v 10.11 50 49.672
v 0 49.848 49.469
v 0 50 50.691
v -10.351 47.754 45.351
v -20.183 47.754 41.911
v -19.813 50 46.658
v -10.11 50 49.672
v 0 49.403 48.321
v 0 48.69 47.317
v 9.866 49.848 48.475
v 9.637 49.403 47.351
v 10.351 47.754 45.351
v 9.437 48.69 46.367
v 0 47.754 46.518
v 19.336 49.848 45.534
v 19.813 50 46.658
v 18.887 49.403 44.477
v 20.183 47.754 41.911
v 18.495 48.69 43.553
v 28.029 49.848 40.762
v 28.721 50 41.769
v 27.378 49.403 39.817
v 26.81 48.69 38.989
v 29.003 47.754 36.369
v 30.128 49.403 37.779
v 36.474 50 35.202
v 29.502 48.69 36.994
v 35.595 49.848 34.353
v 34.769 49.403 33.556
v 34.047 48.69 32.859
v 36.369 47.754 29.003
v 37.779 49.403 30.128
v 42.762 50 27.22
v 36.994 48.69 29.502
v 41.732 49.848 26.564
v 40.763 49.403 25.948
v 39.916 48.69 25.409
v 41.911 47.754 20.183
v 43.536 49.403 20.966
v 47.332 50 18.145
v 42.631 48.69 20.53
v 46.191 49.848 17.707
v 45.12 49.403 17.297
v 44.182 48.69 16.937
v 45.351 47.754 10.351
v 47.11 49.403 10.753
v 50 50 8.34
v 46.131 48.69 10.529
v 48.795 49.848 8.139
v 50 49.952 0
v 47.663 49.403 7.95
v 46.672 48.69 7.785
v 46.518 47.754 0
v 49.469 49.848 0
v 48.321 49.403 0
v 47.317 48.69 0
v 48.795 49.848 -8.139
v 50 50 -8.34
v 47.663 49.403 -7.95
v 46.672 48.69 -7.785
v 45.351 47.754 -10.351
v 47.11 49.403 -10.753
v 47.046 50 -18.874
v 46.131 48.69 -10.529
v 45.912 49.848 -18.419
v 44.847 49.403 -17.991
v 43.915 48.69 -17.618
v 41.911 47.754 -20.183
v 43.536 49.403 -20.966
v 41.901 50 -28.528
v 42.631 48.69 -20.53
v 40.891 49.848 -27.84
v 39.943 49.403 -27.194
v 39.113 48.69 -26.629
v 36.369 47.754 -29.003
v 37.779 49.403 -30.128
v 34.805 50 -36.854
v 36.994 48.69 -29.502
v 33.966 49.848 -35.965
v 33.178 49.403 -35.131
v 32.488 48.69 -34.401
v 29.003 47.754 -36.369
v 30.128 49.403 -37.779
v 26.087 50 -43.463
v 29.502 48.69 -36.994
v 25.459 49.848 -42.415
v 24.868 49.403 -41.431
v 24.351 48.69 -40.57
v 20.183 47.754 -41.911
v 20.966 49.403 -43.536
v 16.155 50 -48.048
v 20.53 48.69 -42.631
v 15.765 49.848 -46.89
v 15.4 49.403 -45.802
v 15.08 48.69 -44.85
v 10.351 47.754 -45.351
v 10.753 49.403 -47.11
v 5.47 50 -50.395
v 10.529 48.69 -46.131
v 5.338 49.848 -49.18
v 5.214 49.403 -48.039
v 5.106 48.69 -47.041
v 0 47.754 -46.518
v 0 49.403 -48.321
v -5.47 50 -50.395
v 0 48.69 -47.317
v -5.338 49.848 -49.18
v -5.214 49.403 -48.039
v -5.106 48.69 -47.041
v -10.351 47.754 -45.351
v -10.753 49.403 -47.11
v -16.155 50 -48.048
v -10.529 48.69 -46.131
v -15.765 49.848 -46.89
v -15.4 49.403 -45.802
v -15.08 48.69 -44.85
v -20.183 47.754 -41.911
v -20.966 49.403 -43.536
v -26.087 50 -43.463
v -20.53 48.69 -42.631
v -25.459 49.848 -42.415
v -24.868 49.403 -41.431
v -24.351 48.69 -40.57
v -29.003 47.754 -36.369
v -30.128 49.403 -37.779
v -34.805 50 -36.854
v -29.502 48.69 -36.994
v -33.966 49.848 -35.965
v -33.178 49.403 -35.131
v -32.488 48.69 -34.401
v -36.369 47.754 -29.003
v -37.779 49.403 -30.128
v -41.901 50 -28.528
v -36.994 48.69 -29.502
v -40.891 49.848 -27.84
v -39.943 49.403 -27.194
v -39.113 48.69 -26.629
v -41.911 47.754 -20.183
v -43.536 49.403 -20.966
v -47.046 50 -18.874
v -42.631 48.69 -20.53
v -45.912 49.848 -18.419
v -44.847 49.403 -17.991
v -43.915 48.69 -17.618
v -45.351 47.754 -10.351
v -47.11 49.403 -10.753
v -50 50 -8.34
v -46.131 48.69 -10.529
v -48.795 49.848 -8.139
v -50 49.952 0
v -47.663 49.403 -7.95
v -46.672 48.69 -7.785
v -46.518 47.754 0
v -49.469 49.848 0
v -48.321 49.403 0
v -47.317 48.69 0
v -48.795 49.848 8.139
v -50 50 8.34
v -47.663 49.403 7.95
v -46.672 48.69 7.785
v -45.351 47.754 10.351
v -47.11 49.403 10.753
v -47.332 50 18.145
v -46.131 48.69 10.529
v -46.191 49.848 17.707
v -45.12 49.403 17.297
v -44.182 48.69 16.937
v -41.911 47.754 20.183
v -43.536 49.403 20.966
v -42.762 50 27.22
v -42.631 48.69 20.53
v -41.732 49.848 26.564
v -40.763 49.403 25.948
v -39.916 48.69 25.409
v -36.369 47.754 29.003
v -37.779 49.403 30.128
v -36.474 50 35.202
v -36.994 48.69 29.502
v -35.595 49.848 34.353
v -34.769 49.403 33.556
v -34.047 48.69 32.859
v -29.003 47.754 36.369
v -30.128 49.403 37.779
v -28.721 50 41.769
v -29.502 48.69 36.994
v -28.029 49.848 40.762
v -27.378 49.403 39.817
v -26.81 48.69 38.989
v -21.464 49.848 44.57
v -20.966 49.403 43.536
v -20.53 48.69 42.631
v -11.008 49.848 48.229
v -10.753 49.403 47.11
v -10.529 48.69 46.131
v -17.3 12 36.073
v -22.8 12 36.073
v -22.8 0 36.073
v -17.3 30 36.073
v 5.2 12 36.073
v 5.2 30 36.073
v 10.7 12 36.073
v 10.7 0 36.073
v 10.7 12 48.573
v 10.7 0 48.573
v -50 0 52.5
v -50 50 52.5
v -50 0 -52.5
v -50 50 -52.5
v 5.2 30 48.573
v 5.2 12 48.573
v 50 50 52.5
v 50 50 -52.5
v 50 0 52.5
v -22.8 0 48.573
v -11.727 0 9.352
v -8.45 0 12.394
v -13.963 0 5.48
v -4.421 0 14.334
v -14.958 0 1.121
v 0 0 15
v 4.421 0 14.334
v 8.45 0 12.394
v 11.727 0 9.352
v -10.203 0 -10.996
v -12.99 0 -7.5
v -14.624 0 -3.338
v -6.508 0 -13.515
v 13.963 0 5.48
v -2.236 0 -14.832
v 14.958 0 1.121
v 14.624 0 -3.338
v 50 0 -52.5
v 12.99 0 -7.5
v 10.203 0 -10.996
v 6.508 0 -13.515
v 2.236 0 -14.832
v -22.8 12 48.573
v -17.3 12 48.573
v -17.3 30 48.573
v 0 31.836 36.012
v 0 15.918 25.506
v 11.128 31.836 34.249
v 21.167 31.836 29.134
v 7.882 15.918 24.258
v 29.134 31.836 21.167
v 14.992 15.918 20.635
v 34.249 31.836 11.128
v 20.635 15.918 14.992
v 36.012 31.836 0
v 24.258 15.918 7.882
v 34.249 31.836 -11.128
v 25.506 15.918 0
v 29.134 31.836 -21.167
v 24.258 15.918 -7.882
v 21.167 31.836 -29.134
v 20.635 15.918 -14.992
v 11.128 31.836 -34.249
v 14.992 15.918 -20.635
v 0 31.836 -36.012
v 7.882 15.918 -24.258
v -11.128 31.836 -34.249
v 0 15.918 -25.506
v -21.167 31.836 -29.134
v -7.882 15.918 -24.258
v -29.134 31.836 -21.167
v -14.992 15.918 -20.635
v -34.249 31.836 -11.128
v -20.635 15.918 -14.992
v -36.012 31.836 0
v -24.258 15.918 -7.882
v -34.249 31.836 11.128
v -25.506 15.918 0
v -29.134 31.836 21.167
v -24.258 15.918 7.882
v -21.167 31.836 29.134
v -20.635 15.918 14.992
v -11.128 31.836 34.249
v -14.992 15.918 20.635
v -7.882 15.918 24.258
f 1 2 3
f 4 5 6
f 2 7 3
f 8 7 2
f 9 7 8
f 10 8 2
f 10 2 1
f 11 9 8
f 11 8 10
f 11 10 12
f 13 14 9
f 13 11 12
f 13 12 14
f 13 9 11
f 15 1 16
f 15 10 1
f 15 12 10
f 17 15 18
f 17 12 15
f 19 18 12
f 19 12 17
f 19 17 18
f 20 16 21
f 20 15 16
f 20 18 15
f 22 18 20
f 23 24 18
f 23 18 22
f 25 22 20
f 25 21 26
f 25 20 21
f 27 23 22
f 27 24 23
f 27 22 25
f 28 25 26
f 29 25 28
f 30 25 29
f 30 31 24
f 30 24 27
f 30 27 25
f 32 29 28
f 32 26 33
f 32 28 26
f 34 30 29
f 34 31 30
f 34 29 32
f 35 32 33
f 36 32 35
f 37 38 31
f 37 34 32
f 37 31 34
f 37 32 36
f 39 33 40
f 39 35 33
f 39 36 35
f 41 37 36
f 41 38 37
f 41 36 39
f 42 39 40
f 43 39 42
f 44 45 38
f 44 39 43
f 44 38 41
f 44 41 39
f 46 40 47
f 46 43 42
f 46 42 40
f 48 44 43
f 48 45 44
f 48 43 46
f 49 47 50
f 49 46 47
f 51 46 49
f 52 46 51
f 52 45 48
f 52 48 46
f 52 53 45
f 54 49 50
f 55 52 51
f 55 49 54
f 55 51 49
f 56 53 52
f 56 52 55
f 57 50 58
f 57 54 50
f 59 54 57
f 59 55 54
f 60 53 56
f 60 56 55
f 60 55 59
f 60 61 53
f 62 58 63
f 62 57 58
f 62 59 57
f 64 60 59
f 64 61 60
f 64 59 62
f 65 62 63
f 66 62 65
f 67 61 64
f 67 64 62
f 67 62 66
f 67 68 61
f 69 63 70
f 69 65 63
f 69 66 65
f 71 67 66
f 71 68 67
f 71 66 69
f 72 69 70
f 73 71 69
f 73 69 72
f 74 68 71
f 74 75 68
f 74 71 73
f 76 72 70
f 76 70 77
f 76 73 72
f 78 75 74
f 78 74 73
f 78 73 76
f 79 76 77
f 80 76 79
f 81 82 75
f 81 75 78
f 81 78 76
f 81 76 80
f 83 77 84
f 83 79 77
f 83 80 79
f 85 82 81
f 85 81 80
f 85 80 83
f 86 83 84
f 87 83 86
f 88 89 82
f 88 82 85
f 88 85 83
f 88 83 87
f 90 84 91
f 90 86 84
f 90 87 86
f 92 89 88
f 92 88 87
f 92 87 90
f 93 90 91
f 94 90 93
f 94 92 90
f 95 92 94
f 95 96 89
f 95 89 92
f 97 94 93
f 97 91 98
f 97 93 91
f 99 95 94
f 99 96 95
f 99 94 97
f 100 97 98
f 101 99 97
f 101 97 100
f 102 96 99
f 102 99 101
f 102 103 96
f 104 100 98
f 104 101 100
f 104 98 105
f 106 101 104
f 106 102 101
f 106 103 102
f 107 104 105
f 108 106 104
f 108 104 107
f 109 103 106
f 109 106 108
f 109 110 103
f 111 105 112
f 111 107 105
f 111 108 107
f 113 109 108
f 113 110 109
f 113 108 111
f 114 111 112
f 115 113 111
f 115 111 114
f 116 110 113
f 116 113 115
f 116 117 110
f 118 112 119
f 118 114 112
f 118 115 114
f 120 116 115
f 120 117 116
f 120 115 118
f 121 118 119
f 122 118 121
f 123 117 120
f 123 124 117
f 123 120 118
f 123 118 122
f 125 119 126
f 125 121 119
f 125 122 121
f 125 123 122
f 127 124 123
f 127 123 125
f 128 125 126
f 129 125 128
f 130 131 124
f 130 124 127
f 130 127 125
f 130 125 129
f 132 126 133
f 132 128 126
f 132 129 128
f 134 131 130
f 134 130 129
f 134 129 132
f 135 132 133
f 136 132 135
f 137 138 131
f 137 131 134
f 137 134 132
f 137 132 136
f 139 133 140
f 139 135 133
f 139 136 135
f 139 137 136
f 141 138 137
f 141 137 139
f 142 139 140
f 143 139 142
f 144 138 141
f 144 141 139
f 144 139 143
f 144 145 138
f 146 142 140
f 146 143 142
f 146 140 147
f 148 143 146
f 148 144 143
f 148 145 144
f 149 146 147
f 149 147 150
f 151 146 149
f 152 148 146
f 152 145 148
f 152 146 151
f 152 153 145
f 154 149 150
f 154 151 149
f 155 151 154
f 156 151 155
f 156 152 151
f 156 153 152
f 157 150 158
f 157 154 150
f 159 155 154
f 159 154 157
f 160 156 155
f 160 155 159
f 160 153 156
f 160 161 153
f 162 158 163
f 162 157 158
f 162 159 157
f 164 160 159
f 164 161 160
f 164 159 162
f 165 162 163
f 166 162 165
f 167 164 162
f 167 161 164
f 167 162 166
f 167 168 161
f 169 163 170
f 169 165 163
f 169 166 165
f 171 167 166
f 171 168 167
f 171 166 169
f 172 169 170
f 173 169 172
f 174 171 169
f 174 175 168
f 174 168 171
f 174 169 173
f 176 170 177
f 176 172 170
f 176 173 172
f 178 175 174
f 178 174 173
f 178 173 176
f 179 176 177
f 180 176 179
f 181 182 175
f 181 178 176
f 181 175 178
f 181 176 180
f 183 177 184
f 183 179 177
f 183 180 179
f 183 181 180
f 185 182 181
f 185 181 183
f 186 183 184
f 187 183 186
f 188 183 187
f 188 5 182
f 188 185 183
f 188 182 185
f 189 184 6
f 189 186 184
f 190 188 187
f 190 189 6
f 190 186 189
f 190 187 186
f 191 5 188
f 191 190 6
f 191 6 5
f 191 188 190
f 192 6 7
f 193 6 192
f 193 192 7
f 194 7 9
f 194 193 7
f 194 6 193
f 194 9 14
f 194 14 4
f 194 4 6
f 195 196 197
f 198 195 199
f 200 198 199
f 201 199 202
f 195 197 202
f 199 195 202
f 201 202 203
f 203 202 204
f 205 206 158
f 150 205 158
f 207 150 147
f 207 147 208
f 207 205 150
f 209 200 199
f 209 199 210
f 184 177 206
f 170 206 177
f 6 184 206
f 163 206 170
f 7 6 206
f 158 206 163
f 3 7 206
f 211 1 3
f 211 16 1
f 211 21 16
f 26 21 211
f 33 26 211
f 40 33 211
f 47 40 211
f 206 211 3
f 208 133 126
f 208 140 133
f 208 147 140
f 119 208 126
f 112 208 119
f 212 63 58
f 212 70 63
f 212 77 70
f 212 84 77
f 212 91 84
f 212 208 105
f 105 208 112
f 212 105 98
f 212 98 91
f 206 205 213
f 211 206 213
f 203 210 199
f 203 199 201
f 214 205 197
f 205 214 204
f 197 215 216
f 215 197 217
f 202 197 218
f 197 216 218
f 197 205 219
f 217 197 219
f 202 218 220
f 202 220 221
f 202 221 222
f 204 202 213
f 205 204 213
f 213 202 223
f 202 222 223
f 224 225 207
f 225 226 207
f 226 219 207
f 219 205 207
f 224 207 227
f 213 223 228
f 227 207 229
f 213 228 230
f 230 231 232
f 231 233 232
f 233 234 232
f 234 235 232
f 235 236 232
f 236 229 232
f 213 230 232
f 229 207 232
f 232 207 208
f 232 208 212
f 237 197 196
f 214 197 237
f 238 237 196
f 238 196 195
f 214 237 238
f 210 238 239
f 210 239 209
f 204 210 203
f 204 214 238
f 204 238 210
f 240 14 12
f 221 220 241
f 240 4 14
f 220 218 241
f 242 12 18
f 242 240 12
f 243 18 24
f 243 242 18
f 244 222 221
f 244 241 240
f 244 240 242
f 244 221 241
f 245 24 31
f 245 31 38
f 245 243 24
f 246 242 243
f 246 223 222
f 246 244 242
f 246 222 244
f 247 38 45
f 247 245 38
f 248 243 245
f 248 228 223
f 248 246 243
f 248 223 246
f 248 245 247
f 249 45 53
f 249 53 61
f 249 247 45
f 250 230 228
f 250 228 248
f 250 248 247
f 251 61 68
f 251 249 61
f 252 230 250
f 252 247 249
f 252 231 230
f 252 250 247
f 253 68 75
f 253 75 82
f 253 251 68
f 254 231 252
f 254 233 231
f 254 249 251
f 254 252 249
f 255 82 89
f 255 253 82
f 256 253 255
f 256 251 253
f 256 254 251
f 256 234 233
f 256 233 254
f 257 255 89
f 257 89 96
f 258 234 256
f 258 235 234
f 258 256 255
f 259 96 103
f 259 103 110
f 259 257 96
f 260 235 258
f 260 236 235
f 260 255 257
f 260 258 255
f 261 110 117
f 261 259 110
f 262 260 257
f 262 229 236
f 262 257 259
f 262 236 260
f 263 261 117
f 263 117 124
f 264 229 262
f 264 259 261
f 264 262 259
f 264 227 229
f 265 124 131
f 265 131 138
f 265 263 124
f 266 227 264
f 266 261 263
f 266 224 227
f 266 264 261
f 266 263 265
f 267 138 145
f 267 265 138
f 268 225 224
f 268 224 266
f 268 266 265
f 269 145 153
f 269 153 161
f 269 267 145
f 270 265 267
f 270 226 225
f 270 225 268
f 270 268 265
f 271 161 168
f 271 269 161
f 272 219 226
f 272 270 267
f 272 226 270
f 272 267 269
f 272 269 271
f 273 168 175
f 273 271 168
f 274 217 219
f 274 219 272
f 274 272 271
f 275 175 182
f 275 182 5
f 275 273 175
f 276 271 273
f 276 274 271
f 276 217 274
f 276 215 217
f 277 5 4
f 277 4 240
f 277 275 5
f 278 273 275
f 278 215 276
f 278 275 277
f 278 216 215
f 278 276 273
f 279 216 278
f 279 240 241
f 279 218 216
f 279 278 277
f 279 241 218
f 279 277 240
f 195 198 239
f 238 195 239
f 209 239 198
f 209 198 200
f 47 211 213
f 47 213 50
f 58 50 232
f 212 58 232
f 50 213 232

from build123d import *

# Parameters (mm, degrees)
SKETCH1_W           = 100
SKETCH1_H           = 105
BOSS_EXTRUDE1_DEPTH = 50
FILLET1_R           = 5
SKETCH8_W           = 22.5
SKETCH8_H           = 12.5
CUT_EXTRUDE4_DEPTH  = 30
SKETCH9_W           = 33.5
SKETCH9_H           = 12.5
CUT_EXTRUDE5_DEPTH  = 12


with BuildPart() as part:
    # Sketch1 → Boss-Extrude1 (new body)
    with BuildSketch(Plane(origin=(0, 0, 0), x_dir=(1, 0, 0), z_dir=(0, 1, 0))):
        Rectangle(SKETCH1_W, SKETCH1_H)
    extrude(amount=BOSS_EXTRUDE1_DEPTH)

    # Sketch5 → Cut-Revolve1 (revolve, cut)
    with BuildSketch(Plane(origin=(0, 0, 0), x_dir=(0, 0, -1), z_dir=(1, 0, 0))):
        Polygon((-48, 50), (-15, 0), (0, 0), (0, 50), align=None)
    revolve(axis=Axis((0, -20.231136995, 0), (0, 1, 0)), mode=Mode.SUBTRACT)

    # Fillet1
    # the kernel refuses this fillet: 5 mm, written as the material it takes off along each edge
    with BuildSketch(Plane(origin=(0, 50, 0), x_dir=(0, 0, 1), z_dir=(-1, 0, 0))) as fillet1_piece_1:
        with BuildLine():
            CenterArc((48 + FILLET1_R * 0.53816526406, -FILLET1_R), FILLET1_R, 90, 56.575188817)
            Line((48 - FILLET1_R * 0.296444142502, -FILLET1_R * 0.449157791669), (48, 0))
            Line((48, 0), (48 + FILLET1_R * 0.53816526406, 0))
        make_face()
    revolve(axis=Axis((0, 50, 0), (0, 1, 0)), mode=Mode.SUBTRACT)

    # Sketch8 → Cut-Extrude4 (cut)
    with BuildSketch(Plane.XZ):
        with Locations((-6.05, 42.323299426)):
            Rectangle(SKETCH8_W, SKETCH8_H)
    extrude(amount=-CUT_EXTRUDE4_DEPTH, mode=Mode.SUBTRACT)

    # Sketch9 → Cut-Extrude5 (cut)
    with BuildSketch(Plane.XZ):
        with Locations((-6.05, 42.323299426)):
            Rectangle(SKETCH9_W, SKETCH9_H)
    extrude(amount=-CUT_EXTRUDE5_DEPTH, mode=Mode.SUBTRACT)


solid = part.part
